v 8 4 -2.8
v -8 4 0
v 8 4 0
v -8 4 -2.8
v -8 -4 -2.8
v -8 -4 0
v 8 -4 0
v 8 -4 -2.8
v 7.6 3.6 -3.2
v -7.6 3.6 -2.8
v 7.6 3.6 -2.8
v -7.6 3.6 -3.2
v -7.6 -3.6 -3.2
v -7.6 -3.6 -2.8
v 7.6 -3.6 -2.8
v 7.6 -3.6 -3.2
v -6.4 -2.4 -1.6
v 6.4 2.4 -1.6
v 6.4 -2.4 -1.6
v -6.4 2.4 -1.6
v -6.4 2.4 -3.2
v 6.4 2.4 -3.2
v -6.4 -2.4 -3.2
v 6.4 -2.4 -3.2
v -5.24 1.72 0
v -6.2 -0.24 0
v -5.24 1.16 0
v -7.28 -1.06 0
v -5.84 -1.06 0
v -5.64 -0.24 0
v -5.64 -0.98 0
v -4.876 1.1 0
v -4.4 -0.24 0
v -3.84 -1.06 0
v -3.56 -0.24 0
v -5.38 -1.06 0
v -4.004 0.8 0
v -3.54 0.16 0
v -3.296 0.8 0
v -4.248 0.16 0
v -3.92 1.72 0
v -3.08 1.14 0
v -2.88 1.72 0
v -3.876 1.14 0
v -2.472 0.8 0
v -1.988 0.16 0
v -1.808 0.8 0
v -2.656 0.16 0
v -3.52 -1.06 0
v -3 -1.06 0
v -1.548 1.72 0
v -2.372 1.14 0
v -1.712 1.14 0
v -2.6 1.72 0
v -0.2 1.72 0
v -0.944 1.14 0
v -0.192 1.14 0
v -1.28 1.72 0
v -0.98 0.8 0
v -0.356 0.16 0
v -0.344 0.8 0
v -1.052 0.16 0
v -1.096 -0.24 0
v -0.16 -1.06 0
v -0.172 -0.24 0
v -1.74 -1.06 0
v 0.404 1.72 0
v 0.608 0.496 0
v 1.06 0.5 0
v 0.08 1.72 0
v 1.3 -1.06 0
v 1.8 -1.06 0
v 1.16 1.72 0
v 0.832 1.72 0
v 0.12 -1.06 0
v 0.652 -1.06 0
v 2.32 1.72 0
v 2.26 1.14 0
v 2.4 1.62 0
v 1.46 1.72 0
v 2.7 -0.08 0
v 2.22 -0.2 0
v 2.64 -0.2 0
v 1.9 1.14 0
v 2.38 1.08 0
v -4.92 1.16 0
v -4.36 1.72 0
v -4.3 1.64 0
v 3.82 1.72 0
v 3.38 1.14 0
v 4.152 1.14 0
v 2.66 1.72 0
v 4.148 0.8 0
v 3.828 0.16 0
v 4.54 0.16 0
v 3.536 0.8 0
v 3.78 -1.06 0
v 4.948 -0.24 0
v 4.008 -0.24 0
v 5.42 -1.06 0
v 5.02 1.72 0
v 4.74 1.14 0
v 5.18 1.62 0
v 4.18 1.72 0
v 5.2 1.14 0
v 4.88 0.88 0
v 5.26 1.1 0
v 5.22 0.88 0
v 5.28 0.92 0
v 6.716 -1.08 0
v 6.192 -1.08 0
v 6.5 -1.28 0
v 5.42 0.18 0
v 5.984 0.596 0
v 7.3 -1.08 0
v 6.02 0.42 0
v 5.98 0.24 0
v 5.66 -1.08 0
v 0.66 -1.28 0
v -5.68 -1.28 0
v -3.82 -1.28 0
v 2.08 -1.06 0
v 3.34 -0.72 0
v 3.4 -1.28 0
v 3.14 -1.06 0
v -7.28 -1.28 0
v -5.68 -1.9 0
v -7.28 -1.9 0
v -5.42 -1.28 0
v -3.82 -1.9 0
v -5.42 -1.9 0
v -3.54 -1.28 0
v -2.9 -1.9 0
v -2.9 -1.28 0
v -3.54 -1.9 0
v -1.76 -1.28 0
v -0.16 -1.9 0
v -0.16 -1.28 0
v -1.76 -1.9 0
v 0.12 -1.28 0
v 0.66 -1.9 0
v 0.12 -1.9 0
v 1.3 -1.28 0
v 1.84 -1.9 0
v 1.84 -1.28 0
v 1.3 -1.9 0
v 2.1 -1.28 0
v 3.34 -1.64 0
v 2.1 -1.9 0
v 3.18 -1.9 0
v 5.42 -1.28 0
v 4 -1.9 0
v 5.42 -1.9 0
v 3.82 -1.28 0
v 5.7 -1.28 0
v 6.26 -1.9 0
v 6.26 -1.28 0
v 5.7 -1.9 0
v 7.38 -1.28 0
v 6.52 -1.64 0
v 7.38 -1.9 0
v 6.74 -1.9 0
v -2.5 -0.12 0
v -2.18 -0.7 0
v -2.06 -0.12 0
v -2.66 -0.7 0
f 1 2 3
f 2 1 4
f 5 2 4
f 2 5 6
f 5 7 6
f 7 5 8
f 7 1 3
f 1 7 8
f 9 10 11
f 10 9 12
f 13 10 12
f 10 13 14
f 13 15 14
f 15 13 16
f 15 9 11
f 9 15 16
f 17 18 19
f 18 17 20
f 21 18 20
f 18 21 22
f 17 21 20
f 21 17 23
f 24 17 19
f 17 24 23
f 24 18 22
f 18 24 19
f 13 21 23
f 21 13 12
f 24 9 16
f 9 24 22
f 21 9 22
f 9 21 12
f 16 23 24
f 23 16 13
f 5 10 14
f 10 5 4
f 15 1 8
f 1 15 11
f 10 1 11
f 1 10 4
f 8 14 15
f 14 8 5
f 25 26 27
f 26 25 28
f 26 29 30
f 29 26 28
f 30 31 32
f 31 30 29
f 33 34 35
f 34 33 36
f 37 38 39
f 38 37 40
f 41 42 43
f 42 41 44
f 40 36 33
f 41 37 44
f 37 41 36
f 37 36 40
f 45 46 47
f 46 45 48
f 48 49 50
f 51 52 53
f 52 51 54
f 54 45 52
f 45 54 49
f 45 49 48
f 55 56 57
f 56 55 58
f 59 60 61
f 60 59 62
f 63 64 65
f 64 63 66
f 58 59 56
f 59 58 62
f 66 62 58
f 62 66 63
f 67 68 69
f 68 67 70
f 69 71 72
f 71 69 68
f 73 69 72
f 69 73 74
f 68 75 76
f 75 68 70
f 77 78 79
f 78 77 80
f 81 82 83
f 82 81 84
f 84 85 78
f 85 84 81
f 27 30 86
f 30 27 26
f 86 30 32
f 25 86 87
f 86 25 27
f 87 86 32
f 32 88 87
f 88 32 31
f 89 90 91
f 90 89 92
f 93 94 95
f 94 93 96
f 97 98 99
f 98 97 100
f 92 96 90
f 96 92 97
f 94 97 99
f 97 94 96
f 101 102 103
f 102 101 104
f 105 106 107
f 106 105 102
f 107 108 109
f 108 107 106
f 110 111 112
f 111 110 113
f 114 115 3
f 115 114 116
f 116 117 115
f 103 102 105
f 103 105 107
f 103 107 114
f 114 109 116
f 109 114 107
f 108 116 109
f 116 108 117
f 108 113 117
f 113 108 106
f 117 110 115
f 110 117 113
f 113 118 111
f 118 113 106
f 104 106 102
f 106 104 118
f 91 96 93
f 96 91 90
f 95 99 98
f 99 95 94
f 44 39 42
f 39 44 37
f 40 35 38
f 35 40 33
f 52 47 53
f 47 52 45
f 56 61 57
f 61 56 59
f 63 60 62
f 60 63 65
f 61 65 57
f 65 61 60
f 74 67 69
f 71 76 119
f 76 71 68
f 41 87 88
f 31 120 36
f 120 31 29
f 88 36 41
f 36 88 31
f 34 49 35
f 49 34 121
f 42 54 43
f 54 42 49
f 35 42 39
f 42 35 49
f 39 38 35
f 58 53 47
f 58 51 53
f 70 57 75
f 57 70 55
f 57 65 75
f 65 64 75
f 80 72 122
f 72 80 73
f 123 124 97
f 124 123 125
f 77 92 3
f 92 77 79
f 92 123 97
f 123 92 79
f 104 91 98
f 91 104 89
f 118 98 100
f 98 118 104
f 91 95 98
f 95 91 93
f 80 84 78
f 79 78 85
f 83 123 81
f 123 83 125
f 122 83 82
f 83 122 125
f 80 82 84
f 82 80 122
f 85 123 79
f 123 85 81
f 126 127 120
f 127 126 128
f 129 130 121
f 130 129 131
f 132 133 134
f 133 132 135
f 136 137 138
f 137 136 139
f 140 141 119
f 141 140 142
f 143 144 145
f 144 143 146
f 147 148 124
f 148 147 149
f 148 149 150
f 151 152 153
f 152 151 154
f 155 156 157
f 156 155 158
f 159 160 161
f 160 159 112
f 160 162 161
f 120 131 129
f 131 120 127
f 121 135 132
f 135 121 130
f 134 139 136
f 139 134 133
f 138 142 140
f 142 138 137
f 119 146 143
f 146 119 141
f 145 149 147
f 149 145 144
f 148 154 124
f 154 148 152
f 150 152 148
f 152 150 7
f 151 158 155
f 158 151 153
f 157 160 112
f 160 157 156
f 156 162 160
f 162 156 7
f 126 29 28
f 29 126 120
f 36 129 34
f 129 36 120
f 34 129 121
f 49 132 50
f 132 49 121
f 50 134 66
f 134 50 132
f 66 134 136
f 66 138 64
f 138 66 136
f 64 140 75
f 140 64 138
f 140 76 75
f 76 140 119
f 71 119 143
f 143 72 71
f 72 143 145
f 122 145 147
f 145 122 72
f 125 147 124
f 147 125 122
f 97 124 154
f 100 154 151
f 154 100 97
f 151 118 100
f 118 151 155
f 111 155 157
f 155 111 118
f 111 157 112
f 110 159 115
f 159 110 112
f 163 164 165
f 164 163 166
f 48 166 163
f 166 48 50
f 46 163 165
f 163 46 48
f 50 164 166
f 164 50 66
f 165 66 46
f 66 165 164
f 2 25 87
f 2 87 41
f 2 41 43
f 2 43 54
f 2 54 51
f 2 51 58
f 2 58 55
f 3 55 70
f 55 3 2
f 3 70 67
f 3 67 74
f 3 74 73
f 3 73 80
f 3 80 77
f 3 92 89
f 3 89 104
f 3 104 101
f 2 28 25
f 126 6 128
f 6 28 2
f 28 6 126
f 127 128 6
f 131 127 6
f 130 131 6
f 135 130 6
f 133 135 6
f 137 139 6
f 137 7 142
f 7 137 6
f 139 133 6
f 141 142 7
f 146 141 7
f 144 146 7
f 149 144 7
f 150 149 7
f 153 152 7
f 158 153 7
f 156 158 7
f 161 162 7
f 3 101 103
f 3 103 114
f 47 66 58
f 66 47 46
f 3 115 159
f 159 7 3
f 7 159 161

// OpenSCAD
// file: ../p/box5.scad
use <../lib.scad>
function ldraw_lib__box5() = [
// 0 Box with 5 Faces and All Edges
// 0 Name: box5.dat
// 0 Author: James Jessiman
// 0 !LDRAW_ORG Primitive UPDATE 2012-01
// 0 !LICENSE Licensed under CC BY 2.0 and CC BY 4.0 : see CAreadme.txt
// 
// 0 BFC CERTIFY CCW
  [0,"BFC","CERTIFY"],
  [0,"BFC","CCW"],
// 
// 0 !HISTORY 2002-04-03 [sbliss] Modified for BFC compliance
// 0 !HISTORY 2002-04-25 [PTadmin] Official Update 2002-02
// 0 !HISTORY 2007-06-24 [PTadmin] Header formatted for Contributor Agreement
// 0 !HISTORY 2008-07-01 [PTadmin] Official Update 2008-01
// 0 !HISTORY 2012-02-16 [Philo] Changed to CCW
// 0 !HISTORY 2012-03-30 [PTadmin] Official Update 2012-01
// 
// 
// 2 24 1 1 1 -1 1 1
  [2,24,1,1,1,-1,1,1],
// 2 24 -1 1 1 -1 1 -1
  [2,24,-1,1,1,-1,1,-1],
// 2 24 -1 1 -1 1 1 -1
  [2,24,-1,1,-1,1,1,-1],
// 2 24 1 1 -1 1 1 1
  [2,24,1,1,-1,1,1,1],
// 2 24 1 0 1 -1 0 1
  [2,24,1,0,1,-1,0,1],
// 2 24 -1 0 1 -1 0 -1
  [2,24,-1,0,1,-1,0,-1],
// 2 24 -1 0 -1 1 0 -1
  [2,24,-1,0,-1,1,0,-1],
// 2 24 1 0 -1 1 0 1
  [2,24,1,0,-1,1,0,1],
// 2 24 1 0 1 1 1 1
  [2,24,1,0,1,1,1,1],
// 2 24 -1 0 1 -1 1 1
  [2,24,-1,0,1,-1,1,1],
// 2 24 1 0 -1 1 1 -1
  [2,24,1,0,-1,1,1,-1],
// 2 24 -1 0 -1 -1 1 -1
  [2,24,-1,0,-1,-1,1,-1],
// 4 16 -1 1 1 1 1 1 1 1 -1 -1 1 -1
  [4,16,-1,1,1,1,1,1,1,1,-1,-1,1,-1],
// 4 16 -1 1 1 -1 0 1 1 0 1 1 1 1
  [4,16,-1,1,1,-1,0,1,1,0,1,1,1,1],
// 4 16 -1 1 -1 -1 0 -1 -1 0 1 -1 1 1
  [4,16,-1,1,-1,-1,0,-1,-1,0,1,-1,1,1],
// 4 16 1 1 -1 1 0 -1 -1 0 -1 -1 1 -1
  [4,16,1,1,-1,1,0,-1,-1,0,-1,-1,1,-1],
// 4 16 1 1 1 1 0 1 1 0 -1 1 1 -1
  [4,16,1,1,1,1,0,1,1,0,-1,1,1,-1],
];
module ldraw_lib__box5(step=0, col=false, unit=2/5, alt=false, line=0.2, solid=!$preview)
    makepoly(ldraw_lib__box5(), step=step, col=col, unit=unit, alt=alt, line=line, solid=solid);
ldraw_lib__box5(line=0.2);
// file: ../p/box4.scad
use <../lib.scad>
function ldraw_lib__box4() = [
// 0 Box with 4 Faces (2 Parallel Pairs) and All Edges
// 0 Name: box4.dat
// 0 Author: James Jessiman
// 0 !LDRAW_ORG Primitive UPDATE 2012-01
// 0 !LICENSE Licensed under CC BY 2.0 and CC BY 4.0 : see CAreadme.txt
// 
// 0 BFC CERTIFY CCW
  [0,"BFC","CERTIFY"],
  [0,"BFC","CCW"],
// 
// 0 !HISTORY 2002-04-03 [sbliss] Modified for BFC compliance
// 0 !HISTORY 2002-04-25 [PTadmin] Official Update 2002-02
// 0 !HISTORY 2007-06-24 [PTadmin] Header formatted for Contributor Agreement
// 0 !HISTORY 2008-07-01 [PTadmin] Official Update 2008-01
// 0 !HISTORY 2012-02-16 [Philo] Changed to CCW
// 0 !HISTORY 2012-03-30 [PTadmin] Official Update 2012-01
// 
// 
// 2 24 1 1 1 -1 1 1
  [2,24,1,1,1,-1,1,1],
// 2 24 -1 1 1 -1 1 -1
  [2,24,-1,1,1,-1,1,-1],
// 2 24 -1 1 -1 1 1 -1
  [2,24,-1,1,-1,1,1,-1],
// 2 24 1 1 -1 1 1 1
  [2,24,1,1,-1,1,1,1],
// 2 24 1 0 1 -1 0 1
  [2,24,1,0,1,-1,0,1],
// 2 24 -1 0 1 -1 0 -1
  [2,24,-1,0,1,-1,0,-1],
// 2 24 -1 0 -1 1 0 -1
  [2,24,-1,0,-1,1,0,-1],
// 2 24 1 0 -1 1 0 1
  [2,24,1,0,-1,1,0,1],
// 2 24 1 0 1 1 1 1
  [2,24,1,0,1,1,1,1],
// 2 24 -1 0 1 -1 1 1
  [2,24,-1,0,1,-1,1,1],
// 2 24 1 0 -1 1 1 -1
  [2,24,1,0,-1,1,1,-1],
// 2 24 -1 0 -1 -1 1 -1
  [2,24,-1,0,-1,-1,1,-1],
// 4 16 -1 1 1 -1 0 1 1 0 1 1 1 1
  [4,16,-1,1,1,-1,0,1,1,0,1,1,1,1],
// 4 16 -1 1 -1 -1 0 -1 -1 0 1 -1 1 1
  [4,16,-1,1,-1,-1,0,-1,-1,0,1,-1,1,1],
// 4 16 1 1 -1 1 0 -1 -1 0 -1 -1 1 -1
  [4,16,1,1,-1,1,0,-1,-1,0,-1,-1,1,-1],
// 4 16 1 1 1 1 0 1 1 0 -1 1 1 -1
  [4,16,1,1,1,1,0,1,1,0,-1,1,1,-1],
];
module ldraw_lib__box4(step=0, col=false, unit=2/5, alt=false, line=0.2, solid=!$preview)
    makepoly(ldraw_lib__box4(), step=step, col=col, unit=unit, alt=alt, line=line, solid=solid);
ldraw_lib__box4(line=0.2);
// file: s/3069bs01.scad
use <../../lib.scad>
use <../../p/box4.scad>
use <../../p/box5.scad>
function ldraw_lib__s__3069bs01() = [
// 0 ~Tile  1 x  2 with Groove without Top Face
// 0 Name: s\3069bs01.dat
// 0 Author: Santeri Piippo [arezey]
// 0 !LDRAW_ORG Subpart UPDATE 2010-02
// 0 !LICENSE Licensed under CC BY 2.0 and CC BY 4.0 : see CAreadme.txt
// 
// 0 BFC CERTIFY CCW
  [0,"BFC","CERTIFY"],
  [0,"BFC","CCW"],
// 
// 0 !HISTORY 2010-07-05 [PTadmin] Official Update 2010-02
// 
// 
// 1 16 0 0 0 20 0 0 0 7 0 0 0 10 box4.dat
  [1,16,0,0,0,20,0,0,0,7,0,0,0,10, ldraw_lib__box4()],
// 1 16 0 7 0 19 0 0 0 1 0 0 0 9 box4.dat
  [1,16,0,7,0,19,0,0,0,1,0,0,0,9, ldraw_lib__box4()],
// 0 BFC INVERTNEXT
  [0,"BFC","INVERTNEXT"],
// 1 16 0 8 0 16 0 0 0 -4 0 0 0 6 box5.dat
  [1,16,0,8,0,16,0,0,0,-4,0,0,0,6, ldraw_lib__box5()],
// 4 16 -19 8 9 -16 8 6 -16 8 -6 -19 8 -9
  [4,16,-19,8,9,-16,8,6,-16,8,-6,-19,8,-9],
// 4 16 19 8 -9 16 8 -6 16 8 6 19 8 9
  [4,16,19,8,-9,16,8,-6,16,8,6,19,8,9],
// 4 16 19 8 9 16 8 6 -16 8 6 -19 8 9
  [4,16,19,8,9,16,8,6,-16,8,6,-19,8,9],
// 4 16 -19 8 -9 -16 8 -6 16 8 -6 19 8 -9
  [4,16,-19,8,-9,-16,8,-6,16,8,-6,19,8,-9],
// 4 16 -20 7 10 -19 7 9 -19 7 -9 -20 7 -10
  [4,16,-20,7,10,-19,7,9,-19,7,-9,-20,7,-10],
// 4 16 20 7 -10 19 7 -9 19 7 9 20 7 10
  [4,16,20,7,-10,19,7,-9,19,7,9,20,7,10],
// 4 16 20 7 10 19 7 9 -19 7 9 -20 7 10
  [4,16,20,7,10,19,7,9,-19,7,9,-20,7,10],
// 4 16 -20 7 -10 -19 7 -9 19 7 -9 20 7 -10
  [4,16,-20,7,-10,-19,7,-9,19,7,-9,20,7,-10],
// 0 //
];
module ldraw_lib__s__3069bs01(step=0, col=false, unit=2/5, alt=false, line=0.2, solid=!$preview)
    makepoly(ldraw_lib__s__3069bs01(), step=step, col=col, unit=unit, alt=alt, line=line, solid=solid);
ldraw_lib__s__3069bs01(line=0.2);
// main file
use <../lib.scad>
use <s/3069bs01.scad>
function ldraw_lib__3069bpxb() = [
// 0 Tile  1 x  2 with Yellow and Red "DEFENDER" Pattern
// 0 Name: 3069bpxb.dat
// 0 Author: Evert-Jan Boer [ejboer]
// 0 !LDRAW_ORG Part UPDATE 2022-04
// 0 !LICENSE Licensed under CC BY 2.0 and CC BY 4.0 : see CAreadme.txt
// 
// 0 BFC CERTIFY CCW
  [0,"BFC","CERTIFY"],
  [0,"BFC","CCW"],
// 
// 0 !KEYWORDS Arcade, Bricklink 3069bpb0475, Dimensions, set 71235
// 
// 0 !HISTORY 2022-07-18 [PTadmin] Official Update 2022-04
// 
// 
// 1 16 0 0 0 1 0 0 0 1 0 0 0 1 s\3069bs01.dat
  [1,16,0,0,0,1,0,0,0,1,0,0,0,1, ldraw_lib__s__3069bs01()],
// 
// 4 14 -13.1 0 4.3 -18.2 0 -2.65 -15.5 0 -.6 -13.1 0 2.9
  [4,14,-13.1,0,4.3,-18.2,0,-2.65,-15.5,0,-.6,-13.1,0,2.9],
// 4 14 -18.2 0 -2.65 -14.6 0 -2.65 -14.1 0 -.6 -15.5 0 -.6
  [4,14,-18.2,0,-2.65,-14.6,0,-2.65,-14.1,0,-.6,-15.5,0,-.6],
// 4 14 -14.6 0 -2.65 -14.1 0 -2.45 -12.19 0 2.75 -14.1 0 -.6
  [4,14,-14.6,0,-2.65,-14.1,0,-2.45,-12.19,0,2.75,-14.1,0,-.6],
// 4 14 -8.9 0 -.6 -11 0 -.6 -13.45 0 -2.65 -9.6 0 -2.65
  [4,14,-8.9,0,-.6,-11,0,-.6,-13.45,0,-2.65,-9.6,0,-2.65],
// 4 14 -8.85 0 .4 -8.24 0 2 -10.01 0 2 -10.62 0 .4
  [4,14,-8.85,0,.4,-8.24,0,2,-10.01,0,2,-10.62,0,.4],
// 4 14 -7.7 0 2.85 -7.2 0 4.3 -9.8 0 4.3 -9.69 0 2.85
  [4,14,-7.7,0,2.85,-7.2,0,4.3,-9.8,0,4.3,-9.69,0,2.85],
// 3 14 -10.62 0 0.4 -13.45 0 -2.65 -11 0 -0.6
  [3,14,-10.62,0,0.4,-13.45,0,-2.65,-11,0,-0.6],
// 4 14 -9.69 0 2.85 -9.8 0 4.3 -13.45 0 -2.65 -10.01 0 2
  [4,14,-9.69,0,2.85,-9.8,0,4.3,-13.45,0,-2.65,-10.01,0,2],
// 3 14 -10.01 0 2 -13.45 0 -2.65 -10.62 0 0.4
  [3,14,-10.01,0,2,-13.45,0,-2.65,-10.62,0,0.4],
// 4 14 -6.64 0 .4 -4.97 0 .4 -4.52 0 2 -6.18 0 2
  [4,14,-6.64,0,.4,-4.97,0,.4,-4.52,0,2,-6.18,0,2],
// 3 14 -6.64 0 0.4 -8.8 0 -2.65 -7.5 0 -2.65
  [3,14,-6.64,0,0.4,-8.8,0,-2.65,-7.5,0,-2.65],
// 4 14 -5.93 0 2.85 -4.28 0 2.85 -3.87 0 4.3 -6.5 0 4.3
  [4,14,-5.93,0,2.85,-4.28,0,2.85,-3.87,0,4.3,-6.5,0,4.3],
// 4 14 -5.93 0 2.85 -6.5 0 4.3 -8.8 0 -2.65 -6.18 0 2
  [4,14,-5.93,0,2.85,-6.5,0,4.3,-8.8,0,-2.65,-6.18,0,2],
// 3 14 -6.18 0 2 -8.8 0 -2.65 -6.64 0 0.4
  [3,14,-6.18,0,2,-8.8,0,-2.65,-6.64,0,0.4],
// 4 14 -3.2 0 4.3 -2.36 0 2.85 -.48 0 2.85 -.5 0 4.3
  [4,14,-3.2,0,4.3,-2.36,0,2.85,-.48,0,2.85,-.5,0,4.3],
// 4 14 -2.63 0 .4 -.89 0 .4 -.86 0 2 -2.45 0 2
  [4,14,-2.63,0,.4,-.89,0,.4,-.86,0,2,-2.45,0,2],
// 4 14 -4.35 0 -2.65 -.4 0 -2.65 -.43 0 -.6 -2.74 0 -.6
  [4,14,-4.35,0,-2.65,-.4,0,-2.65,-.43,0,-.6,-2.74,0,-.6],
// 4 14 -2.63 0 .4 -2.45 0 2 -2.36 0 2.85 -3.2 0 4.3
  [4,14,-2.63,0,.4,-2.45,0,2,-2.36,0,2.85,-3.2,0,4.3],
// 4 14 -3.2 0 4.3 -4.35 0 -2.65 -2.74 0 -.6 -2.63 0 .4
  [4,14,-3.2,0,4.3,-4.35,0,-2.65,-2.74,0,-.6,-2.63,0,.4],
// 4 14 1.01 0 4.3 .2 0 4.3 1.52 0 1.24 2.65 0 1.25
  [4,14,1.01,0,4.3,.2,0,4.3,1.52,0,1.24,2.65,0,1.25],
// 4 14 4.5 0 -2.65 2.65 0 1.25 1.52 0 1.24 3.25 0 -2.65
  [4,14,4.5,0,-2.65,2.65,0,1.25,1.52,0,1.24,3.25,0,-2.65],
// 4 14 4.5 0 -2.65 2.9 0 4.3 2.08 0 4.3 2.65 0 1.25
  [4,14,4.5,0,-2.65,2.9,0,4.3,2.08,0,4.3,2.65,0,1.25],
// 4 14 .2 0 4.3 .3 0 -2.65 1.63 0 -2.65 1.52 0 1.24
  [4,14,.2,0,4.3,.3,0,-2.65,1.63,0,-2.65,1.52,0,1.24],
// 4 14 5.8 0 4.3 3.65 0 4.3 5.65 0 2.85 6 0 4.05
  [4,14,5.8,0,4.3,3.65,0,4.3,5.65,0,2.85,6,0,4.05],
// 4 16 6.75 0 -.2 4.75 0 2.85 5.55 0 -.5 6.6 0 -.5
  [4,16,6.75,0,-.2,4.75,0,2.85,5.55,0,-.5,6.6,0,-.5],
// 4 16 6.75 0 -.2 5.95 0 2.7 5.65 0 2.85 4.75 0 2.85
  [4,16,6.75,0,-.2,5.95,0,2.7,5.65,0,2.85,4.75,0,2.85],
// 4 16 -15.5 0 -.6 -14.1 0 -.6 -12.3 0 2.9 -13.1 0 2.9
  [4,16,-15.5,0,-.6,-14.1,0,-.6,-12.3,0,2.9,-13.1,0,2.9],
// 3 16 -12.3 0 2.9 -14.1 0 -0.6 -12.19 0 2.75
  [3,16,-12.3,0,2.9,-14.1,0,-0.6,-12.19,0,2.75],
// 4 14 -13.1 0 2.9 -12.3 0 2.9 -10.9 0 4.3 -13.1 0 4.3
  [4,14,-13.1,0,2.9,-12.3,0,2.9,-10.9,0,4.3,-13.1,0,4.3],
// 3 14 -10.9 0 4.3 -12.3 0 2.9 -12.19 0 2.75
  [3,14,-10.9,0,4.3,-12.3,0,2.9,-12.19,0,2.75],
// 4 14 -12.19 0 2.75 -14.1 0 -2.45 -10.75 0 4.1 -10.9 0 4.3
  [4,14,-12.19,0,2.75,-14.1,0,-2.45,-10.75,0,4.1,-10.9,0,4.3],
// 4 14 6.65 0 4.3 8.45 0 2.85 10.38 0 2.85 9.55 0 4.3
  [4,14,6.65,0,4.3,8.45,0,2.85,10.38,0,2.85,9.55,0,4.3],
// 4 14 8.84 0 2 9.57 0 .4 11.35 0 .4 10.37 0 2
  [4,14,8.84,0,2,9.57,0,.4,11.35,0,.4,10.37,0,2],
// 4 14 9.45 0 -2.65 13.55 0 -2.65 12.37 0 -.6 10.02 0 -.6
  [4,14,9.45,0,-2.65,13.55,0,-2.65,12.37,0,-.6,10.02,0,-.6],
// 4 14 8.45 0 2.85 6.65 0 4.3 9.45 0 -2.65 8.84 0 2
  [4,14,8.45,0,2.85,6.65,0,4.3,9.45,0,-2.65,8.84,0,2],
// 4 14 8.84 0 2 9.45 0 -2.65 10.02 0 -.6 9.57 0 .4
  [4,14,8.84,0,2,9.45,0,-2.65,10.02,0,-.6,9.57,0,.4],
// 4 14 12.55 0 4.3 10.45 0 4.3 11.85 0 2.85 12.95 0 4.05
  [4,14,12.55,0,4.3,10.45,0,4.3,11.85,0,2.85,12.95,0,4.05],
// 4 16 13.15 0 2.75 13 0 2.85 11.85 0 2.85 12.2 0 2.2
  [4,16,13.15,0,2.75,13,0,2.85,11.85,0,2.85,12.2,0,2.2],
// 4 16 12.2 0 2.2 13.05 0 2.2 13.2 0 2.3 13.15 0 2.75
  [4,16,12.2,0,2.2,13.05,0,2.2,13.2,0,2.3,13.15,0,2.75],
// 4 16 13.55 0 .45 15.48 0 -2.7 16.25 0 -3.2 16.79 0 -2.7
  [4,16,13.55,0,.45,15.48,0,-2.7,16.25,0,-3.2,16.79,0,-2.7],
// 4 16 15.05 0 1.05 18.25 0 -2.7 20 0 10 14.96 0 1.49
  [4,16,15.05,0,1.05,18.25,0,-2.7,20,0,10,14.96,0,1.49],
// 3 16 15.05 0 1.05 14.95 0 0.6 18.25 0 -2.7
  [3,16,15.05,0,1.05,14.95,0,0.6,18.25,0,-2.7],
// 3 14 12.95 0 4.05 11.85 0 2.85 13 0 2.85
  [3,14,12.95,0,4.05,11.85,0,2.85,13,0,2.85],
// 3 14 12.95 0 4.05 13 0 2.85 13.15 0 2.75
  [3,14,12.95,0,4.05,13,0,2.85,13.15,0,2.75],
// 3 14 12.95 0 4.05 13.15 0 2.75 14.96 0 1.49
  [3,14,12.95,0,4.05,13.15,0,2.75,14.96,0,1.49],
// 4 14 15.05 0 1.05 14.96 0 1.49 13.15 0 2.75 13.2 0 2.3
  [4,14,15.05,0,1.05,14.96,0,1.49,13.15,0,2.75,13.2,0,2.3],
// 4 14 15.05 0 1.05 13.2 0 2.3 13.05 0 2.2 14.95 0 .6
  [4,14,15.05,0,1.05,13.2,0,2.3,13.05,0,2.2,14.95,0,.6],
// 4 14 12.2 0 2.2 13.55 0 .45 14.95 0 .6 13.05 0 2.2
  [4,14,12.2,0,2.2,13.55,0,.45,14.95,0,.6,13.05,0,2.2],
// 4 14 13.55 0 .45 16.79 0 -2.7 18.25 0 -2.7 14.95 0 .6
  [4,14,13.55,0,.45,16.79,0,-2.7,18.25,0,-2.7,14.95,0,.6],
// 4 14 12.2 0 2.2 14.15 0 -2.7 15.48 0 -2.7 13.55 0 .45
  [4,14,12.2,0,2.2,14.15,0,-2.7,15.48,0,-2.7,13.55,0,.45],
// 4 14 14.15 0 -2.7 12.2 0 2.2 11.85 0 2.85 10.45 0 4.3
  [4,14,14.15,0,-2.7,12.2,0,2.2,11.85,0,2.85,10.45,0,4.3],
// 4 16 8.84 0 2 10.37 0 2 10.38 0 2.85 8.45 0 2.85
  [4,16,8.84,0,2,10.37,0,2,10.38,0,2.85,8.45,0,2.85],
// 4 16 12.37 0 -.6 11.35 0 .4 9.57 0 .4 10.02 0 -.6
  [4,16,12.37,0,-.6,11.35,0,.4,9.57,0,.4,10.02,0,-.6],
// 4 16 -10.01 0 2 -8.24 0 2 -7.7 0 2.85 -9.69 0 2.85
  [4,16,-10.01,0,2,-8.24,0,2,-7.7,0,2.85,-9.69,0,2.85],
// 4 16 -8.85 0 .4 -10.62 0 .4 -11 0 -.6 -8.9 0 -.6
  [4,16,-8.85,0,.4,-10.62,0,.4,-11,0,-.6,-8.9,0,-.6],
// 4 16 -6.18 0 2 -4.52 0 2 -4.28 0 2.85 -5.93 0 2.85
  [4,16,-6.18,0,2,-4.52,0,2,-4.28,0,2.85,-5.93,0,2.85],
// 4 16 -2.45 0 2 -.86 0 2 -.48 0 2.85 -2.36 0 2.85
  [4,16,-2.45,0,2,-.86,0,2,-.48,0,2.85,-2.36,0,2.85],
// 4 16 -2.74 0 -.6 -.43 0 -.6 -.89 0 .4 -2.63 0 .4
  [4,16,-2.74,0,-.6,-.43,0,-.6,-.89,0,.4,-2.63,0,.4],
// 4 16 -.89 0 .4 -.43 0 -.6 -.48 0 2.85 -.86 0 2
  [4,16,-.89,0,.4,-.43,0,-.6,-.48,0,2.85,-.86,0,2],
// 3 16 2.08 0 4.3 1.01 0 4.3 2.65 0 1.25
  [3,16,2.08,0,4.3,1.01,0,4.3,2.65,0,1.25],
// 4 16 1.65 0 -3.2 3.25 0 -2.65 1.52 0 1.24 1.63 0 -2.65
  [4,16,1.65,0,-3.2,3.25,0,-2.65,1.52,0,1.24,1.63,0,-2.65],
// 3 16 -9.8 0 4.3 -10.9 0 4.3 -10.75 0 4.1
  [3,16,-9.8,0,4.3,-10.9,0,4.3,-10.75,0,4.1],
// 4 16 -14.1 0 -2.45 -14.6 0 -2.65 -14.2 0 -3.2 -13.45 0 -2.65
  [4,16,-14.1,0,-2.45,-14.6,0,-2.65,-14.2,0,-3.2,-13.45,0,-2.65],
// 4 16 -14.1 0 -2.45 -13.45 0 -2.65 -9.8 0 4.3 -10.75 0 4.1
  [4,16,-14.1,0,-2.45,-13.45,0,-2.65,-9.8,0,4.3,-10.75,0,4.1],
// 4 16 -8.9 0 -.6 -9.6 0 -2.65 -9.55 0 -3.2 -8.8 0 -2.65
  [4,16,-8.9,0,-.6,-9.6,0,-2.65,-9.55,0,-3.2,-8.8,0,-2.65],
// 4 16 -7.2 0 4.3 -7.7 0 2.85 -8.8 0 -2.65 -6.5 0 4.3
  [4,16,-7.2,0,4.3,-7.7,0,2.85,-8.8,0,-2.65,-6.5,0,4.3],
// 4 16 -7.7 0 2.85 -8.24 0 2 -8.9 0 -.6 -8.8 0 -2.65
  [4,16,-7.7,0,2.85,-8.24,0,2,-8.9,0,-.6,-8.8,0,-2.65],
// 3 16 -8.24 0 2 -8.85 0 0.4 -8.9 0 -0.6
  [3,16,-8.24,0,2,-8.85,0,0.4,-8.9,0,-0.6],
// 3 16 -3.2 0 4.3 -4.28 0 2.85 -4.52 0 2
  [3,16,-3.2,0,4.3,-4.28,0,2.85,-4.52,0,2],
// 3 16 -3.2 0 4.3 -3.87 0 4.3 -4.28 0 2.85
  [3,16,-3.2,0,4.3,-3.87,0,4.3,-4.28,0,2.85],
// 4 16 -.5 0 4.3 -.48 0 2.85 .3 0 -2.65 .2 0 4.3
  [4,16,-.5,0,4.3,-.48,0,2.85,.3,0,-2.65,.2,0,4.3],
// 3 16 -0.48 0 2.85 -0.43 0 -0.6 0.3 0 -2.65
  [3,16,-0.48,0,2.85,-0.43,0,-0.6,0.3,0,-2.65],
// 3 16 -0.43 0 -0.6 -0.4 0 -2.65 0.3 0 -2.65
  [3,16,-0.43,0,-0.6,-0.4,0,-2.65,0.3,0,-2.65],
// 4 16 2.9 0 4.3 4.5 0 -2.65 5.2 0 -2.65 3.65 0 4.3
  [4,16,2.9,0,4.3,4.5,0,-2.65,5.2,0,-2.65,3.65,0,4.3],
// 4 16 8.35 0 -1.8 7.85 0 -2.65 8.5 0 -3.2 9.45 0 -2.65
  [4,16,8.35,0,-1.8,7.85,0,-2.65,8.5,0,-3.2,9.45,0,-2.65],
// 4 16 20 0 10 5.8 0 4.3 6 0 4.05 6.65 0 4.3
  [4,16,20,0,10,5.8,0,4.3,6,0,4.05,6.65,0,4.3],
// 4 16 6 0 4.05 8.35 0 -1.8 9.45 0 -2.65 6.65 0 4.3
  [4,16,6,0,4.05,8.35,0,-1.8,9.45,0,-2.65,6.65,0,4.3],
// 4 16 9.55 0 4.3 10.38 0 2.85 12.37 0 -.6 10.45 0 4.3
  [4,16,9.55,0,4.3,10.38,0,2.85,12.37,0,-.6,10.45,0,4.3],
// 4 16 13.55 0 -2.65 14.15 0 -2.7 10.45 0 4.3 12.37 0 -.6
  [4,16,13.55,0,-2.65,14.15,0,-2.7,10.45,0,4.3,12.37,0,-.6],
// 4 16 10.37 0 2 11.35 0 .4 12.37 0 -.6 10.38 0 2.85
  [4,16,10.37,0,2,11.35,0,.4,12.37,0,-.6,10.38,0,2.85],
// 3 14 3.65 0 4.3 4.75 0 2.85 5.65 0 2.85
  [3,14,3.65,0,4.3,4.75,0,2.85,5.65,0,2.85],
// 3 14 6 0 4.05 5.65 0 2.85 5.95 0 2.7
  [3,14,6,0,4.05,5.65,0,2.85,5.95,0,2.7],
// 4 14 7.85 0 -2.65 8.35 0 -1.8 6.75 0 -.2 6.6 0 -.5
  [4,14,7.85,0,-2.65,8.35,0,-1.8,6.75,0,-.2,6.6,0,-.5],
// 4 14 5.55 0 -.5 5.2 0 -2.65 7.85 0 -2.65 6.6 0 -.5
  [4,14,5.55,0,-.5,5.2,0,-2.65,7.85,0,-2.65,6.6,0,-.5],
// 4 14 5.2 0 -2.65 5.55 0 -.5 4.75 0 2.85 3.65 0 4.3
  [4,14,5.2,0,-2.65,5.55,0,-.5,4.75,0,2.85,3.65,0,4.3],
// 4 14 5.95 0 2.7 6.75 0 -.2 8.35 0 -1.8 6 0 4.05
  [4,14,5.95,0,2.7,6.75,0,-.2,8.35,0,-1.8,6,0,4.05],
// 4 4 -18.2 0 -3.2 -18.2 0 -4.75 -14.2 0 -4.75 -14.2 0 -3.2
  [4,4,-18.2,0,-3.2,-18.2,0,-4.75,-14.2,0,-4.75,-14.2,0,-3.2],
// 4 4 -13.55 0 -3.2 -13.55 0 -4.75 -9.55 0 -4.75 -9.55 0 -3.2
  [4,4,-13.55,0,-3.2,-13.55,0,-4.75,-9.55,0,-4.75,-9.55,0,-3.2],
// 4 4 -8.85 0 -3.2 -8.85 0 -4.75 -7.25 0 -4.75 -7.25 0 -3.2
  [4,4,-8.85,0,-3.2,-8.85,0,-4.75,-7.25,0,-4.75,-7.25,0,-3.2],
// 4 4 -4.4 0 -3.2 -4.4 0 -4.75 -.4 0 -4.75 -.4 0 -3.2
  [4,4,-4.4,0,-3.2,-4.4,0,-4.75,-.4,0,-4.75,-.4,0,-3.2],
// 4 4 .3 0 -3.2 .3 0 -4.75 1.65 0 -4.75 1.65 0 -3.2
  [4,4,.3,0,-3.2,.3,0,-4.75,1.65,0,-4.75,1.65,0,-3.2],
// 4 4 3.25 0 -3.2 3.25 0 -4.75 4.6 0 -4.75 4.6 0 -3.2
  [4,4,3.25,0,-3.2,3.25,0,-4.75,4.6,0,-4.75,4.6,0,-3.2],
// 4 4 5.25 0 -3.2 5.25 0 -4.75 8.35 0 -4.1 8.5 0 -3.2
  [4,4,5.25,0,-3.2,5.25,0,-4.75,8.35,0,-4.1,8.5,0,-3.2],
// 3 4 8.35 0 -4.1 5.25 0 -4.75 7.95 0 -4.75
  [3,4,8.35,0,-4.1,5.25,0,-4.75,7.95,0,-4.75],
// 4 4 9.55 0 -3.2 10 0 -4.75 13.55 0 -4.75 13.55 0 -3.2
  [4,4,9.55,0,-3.2,10,0,-4.75,13.55,0,-4.75,13.55,0,-3.2],
// 4 4 15.65 0 -4.75 15.65 0 -3.2 14.25 0 -3.2 14.25 0 -4.75
  [4,4,15.65,0,-4.75,15.65,0,-3.2,14.25,0,-3.2,14.25,0,-4.75],
// 4 4 16.25 0 -3.2 16.3 0 -4.1 18.45 0 -4.75 18.45 0 -3.2
  [4,4,16.25,0,-3.2,16.3,0,-4.1,18.45,0,-4.75,18.45,0,-3.2],
// 3 4 16.3 0 -4.1 16.85 0 -4.75 18.45 0 -4.75
  [3,4,16.3,0,-4.1,16.85,0,-4.75,18.45,0,-4.75],
// 4 16 -14.2 0 -3.2 -14.2 0 -4.75 -13.55 0 -4.75 -13.55 0 -3.2
  [4,16,-14.2,0,-3.2,-14.2,0,-4.75,-13.55,0,-4.75,-13.55,0,-3.2],
// 4 16 -9.55 0 -3.2 -9.55 0 -4.75 -8.85 0 -4.75 -8.85 0 -3.2
  [4,16,-9.55,0,-3.2,-9.55,0,-4.75,-8.85,0,-4.75,-8.85,0,-3.2],
// 4 16 -7.25 0 -3.2 -7.25 0 -4.75 -4.4 0 -4.75 -4.4 0 -3.2
  [4,16,-7.25,0,-3.2,-7.25,0,-4.75,-4.4,0,-4.75,-4.4,0,-3.2],
// 4 16 -.4 0 -3.2 -.4 0 -4.75 .3 0 -4.75 .3 0 -3.2
  [4,16,-.4,0,-3.2,-.4,0,-4.75,.3,0,-4.75,.3,0,-3.2],
// 4 16 1.65 0 -3.2 1.65 0 -4.75 3.25 0 -4.75 3.25 0 -3.2
  [4,16,1.65,0,-3.2,1.65,0,-4.75,3.25,0,-4.75,3.25,0,-3.2],
// 4 16 4.6 0 -3.2 4.6 0 -4.75 5.25 0 -4.75 5.25 0 -3.2
  [4,16,4.6,0,-3.2,4.6,0,-4.75,5.25,0,-4.75,5.25,0,-3.2],
// 4 16 8.5 0 -3.2 8.35 0 -4.1 10 0 -4.75 9.55 0 -3.2
  [4,16,8.5,0,-3.2,8.35,0,-4.1,10,0,-4.75,9.55,0,-3.2],
// 4 16 8.35 0 -4.1 7.95 0 -4.75 20 0 -10 10 0 -4.75
  [4,16,8.35,0,-4.1,7.95,0,-4.75,20,0,-10,10,0,-4.75],
// 4 16 13.55 0 -3.2 13.55 0 -4.75 14.25 0 -4.75 14.25 0 -3.2
  [4,16,13.55,0,-3.2,13.55,0,-4.75,14.25,0,-4.75,14.25,0,-3.2],
// 4 16 15.65 0 -4.75 16.3 0 -4.1 16.25 0 -3.2 15.65 0 -3.2
  [4,16,15.65,0,-4.75,16.3,0,-4.1,16.25,0,-3.2,15.65,0,-3.2],
// 4 16 20 0 -10 16.85 0 -4.75 16.3 0 -4.1 15.65 0 -4.75
  [4,16,20,0,-10,16.85,0,-4.75,16.3,0,-4.1,15.65,0,-4.75],
// 4 16 -18.2 0 -2.65 -18.2 0 -3.2 -14.2 0 -3.2 -14.6 0 -2.65
  [4,16,-18.2,0,-2.65,-18.2,0,-3.2,-14.2,0,-3.2,-14.6,0,-2.65],
// 4 16 -14.2 0 -3.2 -13.55 0 -3.2 -9.6 0 -2.65 -13.45 0 -2.65
  [4,16,-14.2,0,-3.2,-13.55,0,-3.2,-9.6,0,-2.65,-13.45,0,-2.65],
// 3 16 -9.6 0 -2.65 -13.55 0 -3.2 -9.55 0 -3.2
  [3,16,-9.6,0,-2.65,-13.55,0,-3.2,-9.55,0,-3.2],
// 4 16 -9.55 0 -3.2 -8.85 0 -3.2 -7.5 0 -2.65 -8.8 0 -2.65
  [4,16,-9.55,0,-3.2,-8.85,0,-3.2,-7.5,0,-2.65,-8.8,0,-2.65],
// 4 16 -8.85 0 -3.2 -7.25 0 -3.2 -4.35 0 -2.65 -7.5 0 -2.65
  [4,16,-8.85,0,-3.2,-7.25,0,-3.2,-4.35,0,-2.65,-7.5,0,-2.65],
// 3 16 -4.35 0 -2.65 -7.25 0 -3.2 -4.4 0 -3.2
  [3,16,-4.35,0,-2.65,-7.25,0,-3.2,-4.4,0,-3.2],
// 4 16 -4.4 0 -3.2 -.4 0 -3.2 -.4 0 -2.65 -4.35 0 -2.65
  [4,16,-4.4,0,-3.2,-.4,0,-3.2,-.4,0,-2.65,-4.35,0,-2.65],
// 4 16 -.4 0 -2.65 -.4 0 -3.2 .3 0 -3.2 .3 0 -2.65
  [4,16,-.4,0,-2.65,-.4,0,-3.2,.3,0,-3.2,.3,0,-2.65],
// 4 16 1.65 0 -3.2 1.63 0 -2.65 .3 0 -2.65 .3 0 -3.2
  [4,16,1.65,0,-3.2,1.63,0,-2.65,.3,0,-2.65,.3,0,-3.2],
// 3 16 3.25 0 -2.65 1.65 0 -3.2 3.25 0 -3.2
  [3,16,3.25,0,-2.65,1.65,0,-3.2,3.25,0,-3.2],
// 4 16 3.25 0 -3.2 4.6 0 -3.2 4.5 0 -2.65 3.25 0 -2.65
  [4,16,3.25,0,-3.2,4.6,0,-3.2,4.5,0,-2.65,3.25,0,-2.65],
// 4 16 4.5 0 -2.65 4.6 0 -3.2 5.25 0 -3.2 5.2 0 -2.65
  [4,16,4.5,0,-2.65,4.6,0,-3.2,5.25,0,-3.2,5.2,0,-2.65],
// 4 16 5.2 0 -2.65 5.25 0 -3.2 8.5 0 -3.2 7.85 0 -2.65
  [4,16,5.2,0,-2.65,5.25,0,-3.2,8.5,0,-3.2,7.85,0,-2.65],
// 3 16 9.45 0 -2.65 8.5 0 -3.2 9.55 0 -3.2
  [3,16,9.45,0,-2.65,8.5,0,-3.2,9.55,0,-3.2],
// 4 16 9.55 0 -3.2 13.55 0 -3.2 13.55 0 -2.65 9.45 0 -2.65
  [4,16,9.55,0,-3.2,13.55,0,-3.2,13.55,0,-2.65,9.45,0,-2.65],
// 4 16 14.15 0 -2.7 13.55 0 -2.65 13.55 0 -3.2 14.25 0 -3.2
  [4,16,14.15,0,-2.7,13.55,0,-2.65,13.55,0,-3.2,14.25,0,-3.2],
// 4 16 14.25 0 -3.2 15.65 0 -3.2 15.48 0 -2.7 14.15 0 -2.7
  [4,16,14.25,0,-3.2,15.65,0,-3.2,15.48,0,-2.7,14.15,0,-2.7],
// 3 16 15.48 0 -2.7 15.65 0 -3.2 16.25 0 -3.2
  [3,16,15.48,0,-2.7,15.65,0,-3.2,16.25,0,-3.2],
// 4 16 16.25 0 -3.2 18.45 0 -3.2 18.25 0 -2.7 16.79 0 -2.7
  [4,16,16.25,0,-3.2,18.45,0,-3.2,18.25,0,-2.7,16.79,0,-2.7],
// 4 4 -6.65 0 -1.75 -5.45 0 -1.75 -5.15 0 -.3 -6.25 0 -.3
  [4,4,-6.65,0,-1.75,-5.45,0,-1.75,-5.15,0,-.3,-6.25,0,-.3],
// 4 16 -7.5 0 -2.65 -6.65 0 -1.75 -6.25 0 -.3 -6.64 0 .4
  [4,16,-7.5,0,-2.65,-6.65,0,-1.75,-6.25,0,-.3,-6.64,0,.4],
// 4 16 -6.25 0 -.3 -5.15 0 -.3 -4.97 0 .4 -6.64 0 .4
  [4,16,-6.25,0,-.3,-5.15,0,-.3,-4.97,0,.4,-6.64,0,.4],
// 4 16 -7.5 0 -2.65 -4.35 0 -2.65 -5.45 0 -1.75 -6.65 0 -1.75
  [4,16,-7.5,0,-2.65,-4.35,0,-2.65,-5.45,0,-1.75,-6.65,0,-1.75],
// 4 16 -4.97 0 .4 -5.15 0 -.3 -5.45 0 -1.75 -4.35 0 -2.65
  [4,16,-4.97,0,.4,-5.15,0,-.3,-5.45,0,-1.75,-4.35,0,-2.65],
// 3 16 -20 0 10 -13.1 0 4.3 -10.9 0 4.3
  [3,16,-20,0,10,-13.1,0,4.3,-10.9,0,4.3],
// 3 16 -20 0 10 -10.9 0 4.3 -9.8 0 4.3
  [3,16,-20,0,10,-10.9,0,4.3,-9.8,0,4.3],
// 3 16 -20 0 10 -9.8 0 4.3 -7.2 0 4.3
  [3,16,-20,0,10,-9.8,0,4.3,-7.2,0,4.3],
// 3 16 -20 0 10 -7.2 0 4.3 -6.5 0 4.3
  [3,16,-20,0,10,-7.2,0,4.3,-6.5,0,4.3],
// 3 16 -20 0 10 -6.5 0 4.3 -3.87 0 4.3
  [3,16,-20,0,10,-6.5,0,4.3,-3.87,0,4.3],
// 3 16 -20 0 10 -3.87 0 4.3 -3.2 0 4.3
  [3,16,-20,0,10,-3.87,0,4.3,-3.2,0,4.3],
// 3 16 -20 0 10 -3.2 0 4.3 -0.5 0 4.3
  [3,16,-20,0,10,-3.2,0,4.3,-0.5,0,4.3],
// 4 16 -.5 0 4.3 .2 0 4.3 20 0 10 -20 0 10
  [4,16,-.5,0,4.3,.2,0,4.3,20,0,10,-20,0,10],
// 3 16 20 0 10 0.2 0 4.3 1.01 0 4.3
  [3,16,20,0,10,0.2,0,4.3,1.01,0,4.3],
// 3 16 20 0 10 1.01 0 4.3 2.08 0 4.3
  [3,16,20,0,10,1.01,0,4.3,2.08,0,4.3],
// 3 16 20 0 10 2.08 0 4.3 2.9 0 4.3
  [3,16,20,0,10,2.08,0,4.3,2.9,0,4.3],
// 3 16 20 0 10 2.9 0 4.3 3.65 0 4.3
  [3,16,20,0,10,2.9,0,4.3,3.65,0,4.3],
// 3 16 20 0 10 3.65 0 4.3 5.8 0 4.3
  [3,16,20,0,10,3.65,0,4.3,5.8,0,4.3],
// 3 16 20 0 10 6.65 0 4.3 9.55 0 4.3
  [3,16,20,0,10,6.65,0,4.3,9.55,0,4.3],
// 3 16 20 0 10 9.55 0 4.3 10.45 0 4.3
  [3,16,20,0,10,9.55,0,4.3,10.45,0,4.3],
// 3 16 20 0 10 10.45 0 4.3 12.55 0 4.3
  [3,16,20,0,10,10.45,0,4.3,12.55,0,4.3],
// 3 16 -20 0 10 -18.2 0 -2.65 -13.1 0 4.3
  [3,16,-20,0,10,-18.2,0,-2.65,-13.1,0,4.3],
// 3 16 -18.2 0 -3.2 -20 0 -10 -18.2 0 -4.75
  [3,16,-18.2,0,-3.2,-20,0,-10,-18.2,0,-4.75],
// 4 16 -20 0 10 -20 0 -10 -18.2 0 -3.2 -18.2 0 -2.65
  [4,16,-20,0,10,-20,0,-10,-18.2,0,-3.2,-18.2,0,-2.65],
// 3 16 -14.2 0 -4.75 -18.2 0 -4.75 -20 0 -10
  [3,16,-14.2,0,-4.75,-18.2,0,-4.75,-20,0,-10],
// 3 16 -13.55 0 -4.75 -14.2 0 -4.75 -20 0 -10
  [3,16,-13.55,0,-4.75,-14.2,0,-4.75,-20,0,-10],
// 3 16 -9.55 0 -4.75 -13.55 0 -4.75 -20 0 -10
  [3,16,-9.55,0,-4.75,-13.55,0,-4.75,-20,0,-10],
// 3 16 -8.85 0 -4.75 -9.55 0 -4.75 -20 0 -10
  [3,16,-8.85,0,-4.75,-9.55,0,-4.75,-20,0,-10],
// 3 16 -7.25 0 -4.75 -8.85 0 -4.75 -20 0 -10
  [3,16,-7.25,0,-4.75,-8.85,0,-4.75,-20,0,-10],
// 3 16 -0.4 0 -4.75 -4.4 0 -4.75 -20 0 -10
  [3,16,-0.4,0,-4.75,-4.4,0,-4.75,-20,0,-10],
// 4 16 -.4 0 -4.75 -20 0 -10 20 0 -10 .3 0 -4.75
  [4,16,-.4,0,-4.75,-20,0,-10,20,0,-10,.3,0,-4.75],
// 3 16 -4.4 0 -4.75 -7.25 0 -4.75 -20 0 -10
  [3,16,-4.4,0,-4.75,-7.25,0,-4.75,-20,0,-10],
// 3 16 1.65 0 -4.75 0.3 0 -4.75 20 0 -10
  [3,16,1.65,0,-4.75,0.3,0,-4.75,20,0,-10],
// 3 16 3.25 0 -4.75 1.65 0 -4.75 20 0 -10
  [3,16,3.25,0,-4.75,1.65,0,-4.75,20,0,-10],
// 3 16 4.6 0 -4.75 3.25 0 -4.75 20 0 -10
  [3,16,4.6,0,-4.75,3.25,0,-4.75,20,0,-10],
// 3 16 5.25 0 -4.75 4.6 0 -4.75 20 0 -10
  [3,16,5.25,0,-4.75,4.6,0,-4.75,20,0,-10],
// 3 16 7.95 0 -4.75 5.25 0 -4.75 20 0 -10
  [3,16,7.95,0,-4.75,5.25,0,-4.75,20,0,-10],
// 3 16 13.55 0 -4.75 10 0 -4.75 20 0 -10
  [3,16,13.55,0,-4.75,10,0,-4.75,20,0,-10],
// 3 16 14.25 0 -4.75 13.55 0 -4.75 20 0 -10
  [3,16,14.25,0,-4.75,13.55,0,-4.75,20,0,-10],
// 3 16 15.65 0 -4.75 14.25 0 -4.75 20 0 -10
  [3,16,15.65,0,-4.75,14.25,0,-4.75,20,0,-10],
// 3 16 18.45 0 -4.75 16.85 0 -4.75 20 0 -10
  [3,16,18.45,0,-4.75,16.85,0,-4.75,20,0,-10],
// 3 16 20 0 10 12.55 0 4.3 12.95 0 4.05
  [3,16,20,0,10,12.55,0,4.3,12.95,0,4.05],
// 3 16 20 0 10 12.95 0 4.05 14.96 0 1.49
  [3,16,20,0,10,12.95,0,4.05,14.96,0,1.49],
// 4 16 -4.52 0 2 -4.97 0 .4 -4.35 0 -2.65 -3.2 0 4.3
  [4,16,-4.52,0,2,-4.97,0,.4,-4.35,0,-2.65,-3.2,0,4.3],
// 3 16 20 0 10 18.25 0 -2.7 18.45 0 -3.2
  [3,16,20,0,10,18.25,0,-2.7,18.45,0,-3.2],
// 4 16 18.45 0 -4.75 20 0 -10 20 0 10 18.45 0 -3.2
  [4,16,18.45,0,-4.75,20,0,-10,20,0,10,18.45,0,-3.2],
];
module ldraw_lib__3069bpxb(step=0, col=false, unit=2/5, alt=false, line=0.2, solid=!$preview)
    makepoly(ldraw_lib__3069bpxb(), step=step, col=col, unit=unit, alt=alt, line=line, solid=solid);
ldraw_lib__3069bpxb(line=0.2);
